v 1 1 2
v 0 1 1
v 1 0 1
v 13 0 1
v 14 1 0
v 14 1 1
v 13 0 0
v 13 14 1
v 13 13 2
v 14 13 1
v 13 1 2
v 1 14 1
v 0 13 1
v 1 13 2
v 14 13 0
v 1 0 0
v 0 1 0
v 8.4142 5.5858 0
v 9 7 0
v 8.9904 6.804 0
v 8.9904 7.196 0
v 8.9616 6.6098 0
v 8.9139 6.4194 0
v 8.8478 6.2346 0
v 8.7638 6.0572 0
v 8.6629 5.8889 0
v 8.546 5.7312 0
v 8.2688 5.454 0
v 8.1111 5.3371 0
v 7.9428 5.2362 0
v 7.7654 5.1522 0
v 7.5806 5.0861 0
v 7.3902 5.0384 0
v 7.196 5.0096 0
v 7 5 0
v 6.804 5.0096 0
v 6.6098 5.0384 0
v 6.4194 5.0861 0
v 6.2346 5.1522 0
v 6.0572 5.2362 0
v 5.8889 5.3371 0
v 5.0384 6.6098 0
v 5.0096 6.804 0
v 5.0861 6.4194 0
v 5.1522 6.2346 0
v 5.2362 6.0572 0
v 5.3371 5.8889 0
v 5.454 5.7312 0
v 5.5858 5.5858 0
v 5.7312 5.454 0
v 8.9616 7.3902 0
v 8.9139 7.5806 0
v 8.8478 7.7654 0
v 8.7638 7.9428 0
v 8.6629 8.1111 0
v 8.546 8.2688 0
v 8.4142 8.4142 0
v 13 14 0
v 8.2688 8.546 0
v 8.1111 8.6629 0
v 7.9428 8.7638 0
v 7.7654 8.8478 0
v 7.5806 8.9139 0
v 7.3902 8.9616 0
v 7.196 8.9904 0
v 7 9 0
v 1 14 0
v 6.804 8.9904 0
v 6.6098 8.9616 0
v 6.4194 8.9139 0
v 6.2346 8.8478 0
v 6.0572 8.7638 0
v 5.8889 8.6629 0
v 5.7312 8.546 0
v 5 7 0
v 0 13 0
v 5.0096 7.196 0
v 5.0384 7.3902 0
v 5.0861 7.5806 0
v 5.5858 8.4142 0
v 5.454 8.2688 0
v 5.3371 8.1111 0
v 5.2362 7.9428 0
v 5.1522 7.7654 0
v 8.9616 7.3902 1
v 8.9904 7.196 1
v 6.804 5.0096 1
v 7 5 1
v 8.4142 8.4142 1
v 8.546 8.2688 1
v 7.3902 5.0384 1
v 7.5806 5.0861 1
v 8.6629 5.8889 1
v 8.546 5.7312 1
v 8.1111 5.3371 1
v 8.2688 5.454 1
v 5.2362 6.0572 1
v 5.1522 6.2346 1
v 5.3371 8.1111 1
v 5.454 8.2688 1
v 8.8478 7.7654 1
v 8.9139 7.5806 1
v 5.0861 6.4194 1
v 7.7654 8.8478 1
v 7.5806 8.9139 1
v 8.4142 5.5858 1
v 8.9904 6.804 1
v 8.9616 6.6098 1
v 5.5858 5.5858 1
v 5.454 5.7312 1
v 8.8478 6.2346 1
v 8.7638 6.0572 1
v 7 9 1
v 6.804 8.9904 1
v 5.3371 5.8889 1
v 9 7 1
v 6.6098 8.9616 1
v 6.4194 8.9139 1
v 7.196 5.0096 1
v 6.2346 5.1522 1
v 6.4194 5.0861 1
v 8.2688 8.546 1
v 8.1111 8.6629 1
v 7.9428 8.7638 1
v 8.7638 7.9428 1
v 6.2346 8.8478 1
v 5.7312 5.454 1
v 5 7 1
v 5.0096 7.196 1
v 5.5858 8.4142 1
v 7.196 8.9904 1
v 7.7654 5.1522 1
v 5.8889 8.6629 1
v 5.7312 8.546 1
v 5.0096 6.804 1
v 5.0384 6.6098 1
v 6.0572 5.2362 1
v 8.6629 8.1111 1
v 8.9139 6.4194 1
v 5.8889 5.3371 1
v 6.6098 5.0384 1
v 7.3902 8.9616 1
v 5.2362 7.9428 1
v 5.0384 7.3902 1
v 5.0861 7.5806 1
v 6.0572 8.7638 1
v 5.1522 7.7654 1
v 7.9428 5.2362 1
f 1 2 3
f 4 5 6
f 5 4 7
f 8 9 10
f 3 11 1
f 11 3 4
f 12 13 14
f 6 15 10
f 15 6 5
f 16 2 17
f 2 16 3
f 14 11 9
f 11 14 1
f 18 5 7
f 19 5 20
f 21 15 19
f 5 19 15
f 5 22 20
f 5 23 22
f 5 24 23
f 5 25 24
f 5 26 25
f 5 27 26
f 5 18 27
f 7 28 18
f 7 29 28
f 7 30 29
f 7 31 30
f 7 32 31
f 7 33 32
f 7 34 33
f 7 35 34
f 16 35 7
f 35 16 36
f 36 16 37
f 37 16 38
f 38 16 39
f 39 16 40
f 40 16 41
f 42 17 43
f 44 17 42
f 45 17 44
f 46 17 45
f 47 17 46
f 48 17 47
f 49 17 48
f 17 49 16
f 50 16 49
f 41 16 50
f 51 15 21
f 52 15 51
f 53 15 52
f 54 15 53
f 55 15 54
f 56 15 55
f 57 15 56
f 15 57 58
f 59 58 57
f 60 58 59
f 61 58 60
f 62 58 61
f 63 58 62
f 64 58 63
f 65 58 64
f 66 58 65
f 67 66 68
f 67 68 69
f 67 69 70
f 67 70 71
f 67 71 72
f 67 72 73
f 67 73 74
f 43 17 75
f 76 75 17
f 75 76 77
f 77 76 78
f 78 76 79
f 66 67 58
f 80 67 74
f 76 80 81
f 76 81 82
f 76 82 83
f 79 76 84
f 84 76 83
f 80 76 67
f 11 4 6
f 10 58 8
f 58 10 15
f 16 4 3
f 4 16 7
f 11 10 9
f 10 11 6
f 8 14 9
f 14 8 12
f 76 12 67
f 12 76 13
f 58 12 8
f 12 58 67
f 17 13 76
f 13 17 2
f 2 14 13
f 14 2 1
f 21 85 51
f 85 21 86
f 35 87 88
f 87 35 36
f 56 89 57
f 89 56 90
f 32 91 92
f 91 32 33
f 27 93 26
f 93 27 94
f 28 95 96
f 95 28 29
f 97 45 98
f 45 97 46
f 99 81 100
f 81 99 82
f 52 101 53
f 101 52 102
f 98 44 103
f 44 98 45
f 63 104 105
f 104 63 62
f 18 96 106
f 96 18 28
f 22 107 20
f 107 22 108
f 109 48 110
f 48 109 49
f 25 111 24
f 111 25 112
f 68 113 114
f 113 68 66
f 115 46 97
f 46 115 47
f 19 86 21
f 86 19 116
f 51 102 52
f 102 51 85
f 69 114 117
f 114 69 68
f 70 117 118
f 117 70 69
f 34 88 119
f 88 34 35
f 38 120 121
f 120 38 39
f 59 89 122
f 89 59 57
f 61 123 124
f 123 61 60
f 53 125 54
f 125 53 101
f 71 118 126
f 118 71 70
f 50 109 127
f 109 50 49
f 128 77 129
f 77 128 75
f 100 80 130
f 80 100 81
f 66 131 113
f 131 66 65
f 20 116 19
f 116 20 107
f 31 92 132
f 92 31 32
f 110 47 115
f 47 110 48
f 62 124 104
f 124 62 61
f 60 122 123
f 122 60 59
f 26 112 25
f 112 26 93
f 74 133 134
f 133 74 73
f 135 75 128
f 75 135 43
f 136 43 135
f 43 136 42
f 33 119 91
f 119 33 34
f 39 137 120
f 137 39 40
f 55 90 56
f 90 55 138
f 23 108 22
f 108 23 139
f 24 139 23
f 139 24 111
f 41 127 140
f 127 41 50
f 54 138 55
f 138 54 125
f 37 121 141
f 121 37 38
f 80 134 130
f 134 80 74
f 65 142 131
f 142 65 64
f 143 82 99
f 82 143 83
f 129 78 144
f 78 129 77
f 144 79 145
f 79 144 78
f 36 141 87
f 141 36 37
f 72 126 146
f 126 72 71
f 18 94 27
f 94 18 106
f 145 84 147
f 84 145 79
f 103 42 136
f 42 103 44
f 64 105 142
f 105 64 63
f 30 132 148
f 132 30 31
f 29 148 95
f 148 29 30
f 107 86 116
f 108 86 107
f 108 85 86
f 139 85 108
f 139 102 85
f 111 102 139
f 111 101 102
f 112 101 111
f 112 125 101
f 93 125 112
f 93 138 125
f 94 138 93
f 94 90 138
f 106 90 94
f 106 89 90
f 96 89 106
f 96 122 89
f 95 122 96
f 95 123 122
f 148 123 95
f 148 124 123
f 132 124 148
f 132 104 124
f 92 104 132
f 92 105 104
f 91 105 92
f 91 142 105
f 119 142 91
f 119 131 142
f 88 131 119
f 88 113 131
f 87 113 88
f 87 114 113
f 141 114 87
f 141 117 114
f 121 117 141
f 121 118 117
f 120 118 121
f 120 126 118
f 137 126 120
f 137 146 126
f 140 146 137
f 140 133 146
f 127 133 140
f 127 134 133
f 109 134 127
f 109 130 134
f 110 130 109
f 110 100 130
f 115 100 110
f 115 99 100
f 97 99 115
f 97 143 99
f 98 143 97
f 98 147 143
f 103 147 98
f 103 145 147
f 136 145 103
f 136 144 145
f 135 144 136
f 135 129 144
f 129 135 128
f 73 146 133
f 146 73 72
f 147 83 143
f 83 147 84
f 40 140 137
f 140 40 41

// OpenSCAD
/* Will create a centerhole with automatic diameter and depth by default 
 * (if 'centerhole' is given). "Auto" simply means "The Right Thing Defined
 * By The Programmer I E God */

module tetrisfirkant(xy=14,z=2,centerhole=false,holedia="auto",holedep="auto") {

    zz = z/2;
    xy=xy-z;
    
    /* I wrote this starting off at polyhedras for the first time, so it
     * became upside down. This fixes it. Really, it's much nicer this way,
     * too. Look! It even comes in pink!!! */
    
    translate([zz,zz,z]) {
        
        difference() {
            polyhedron(
                points=[
                    [0,0,0],[xy,0,0],[xy,xy,0],[0,xy,0],    // 0,1,2,3
                    [0,-zz,-zz],[xy,-zz,-zz],               // 4,5
                    [xy+zz,0,-zz],[xy+zz,xy,-zz],           // 6,7
                    [xy,xy+zz,-zz],[0,xy+zz,-zz],           // 8,9
                    [-zz,xy,-zz],[-zz,0,-zz],               // 10,11

                    [0,-zz,-zz*2],[xy,-zz,-zz*2],           // 12,13
                    [xy+zz,0,-zz*2],[xy+zz,xy,-zz*2],       // 14,15
                    [xy,xy+zz,-zz*2],[0,xy+zz,-zz*2],       // 16,17
                    [-zz,xy,-zz*2],[-zz,0,-zz*2]             // 18,19
                ],

                faces=[
                    [0,2,1],[2,0,3],

                    [0,1,4],[1,5,4],[1,6,5],
                    [1,7,6],[1,2,7],[2,8,7],
                    [2,3,8],[3,9,8],[3,10,9],
                    [3,0,10],[0,11,10],[11,0,4],

                    [4,5,12],[5,13,12],[5,6,13],[6,14,13],
                    [6,15,14],[6,7,15],[7,8,15],[8,16,15],
                    [8,17,16],[8,9,17],[9,18,17],[9,10,18],
                    [10,19,18],[10,11,19],[11,12,19],[4,12,11],

                    [12,13,14],[12,14,19],
                    [19,14,15],[19,15,16],
                    [19,16,17],[19,17,18],
                ]
            );  
            if (centerhole) {
                // Assume auto everything for now
                if (holedia != "auto") {
                    echo("Hole diameter is \"auto\" for now. RTFS, please");
                }
                if (holedia != "auto") {
                    echo("Hole depth is \"auto\" for now. RTFS, please");
                }
                holedep = z/2;
                holedia = 4;
                
                translate([xy/2,xy/2,-z]) {
                    cylinder(h=holedep,d=holedia,$fn=64);
                }
            }
        }
    }
}

module tetromino(name,xy=14,z=2,centerhole=false,holedia="auto",holedep="auto") {
    if (name == "I") {
        translate([xy*0,xy*0,0])
            tetrisfirkant(xy=xy,z=z,centerhole=centerhole,holedia=holedia,holedep=holedep);
        translate([xy*0,xy*1,0])
            tetrisfirkant(xy=xy,z=z,centerhole=centerhole,holedia=holedia,holedep=holedep);
        translate([xy*0,xy*2,0])
            tetrisfirkant(xy=xy,z=z,centerhole=centerhole,holedia=holedia,holedep=holedep);
        translate([xy*0,xy*3,0])
            tetrisfirkant(xy=xy,z=z,centerhole=centerhole,holedia=holedia,holedep=holedep);
    } else if (name == "O") {
        translate([xy*0,xy*0,0])
            tetrisfirkant(xy=xy,z=z,centerhole=centerhole,holedia=holedia,holedep=holedep);
        translate([xy*0,xy*1,0])
            tetrisfirkant(xy=xy,z=z,centerhole=centerhole,holedia=holedia,holedep=holedep);
        translate([xy*1,0,0])
            tetrisfirkant(xy=xy,z=z,centerhole=centerhole,holedia=holedia,holedep=holedep);
        translate([xy*1,xy*1,0])
            tetrisfirkant(xy=xy,z=z,centerhole=centerhole,holedia=holedia,holedep=holedep);
    } else if (name == "T") {
        translate([xy*0,xy*0,0])
            tetrisfirkant(xy=xy,z=z,centerhole=centerhole,holedia=holedia,holedep=holedep);
        translate([xy*1,xy*0,0])
            tetrisfirkant(xy=xy,z=z,centerhole=centerhole,holedia=holedia,holedep=holedep);
        translate([xy*2,xy*0,0])
            tetrisfirkant(xy=xy,z=z,centerhole=centerhole,holedia=holedia,holedep=holedep);
        translate([xy*1,xy*1,0])
            tetrisfirkant(xy=xy,z=z,centerhole=centerhole,holedia=holedia,holedep=holedep);
    } else if (name == "J") {
        translate([xy*0,xy*0,0])
            tetrisfirkant(xy=xy,z=z,centerhole=centerhole,holedia=holedia,holedep=holedep);
        translate([xy*1,xy*0,0])
            tetrisfirkant(xy=xy,z=z,centerhole=centerhole,holedia=holedia,holedep=holedep);
        translate([xy*1,xy*1,0])
            tetrisfirkant(xy=xy,z=z,centerhole=centerhole,holedia=holedia,holedep=holedep);
        translate([xy*1,xy*2,0])
            tetrisfirkant(xy=xy,z=z,centerhole=centerhole,holedia=holedia,holedep=holedep);
    } else if (name == "L") {
        translate([xy*0,xy*0,0])
            tetrisfirkant(xy=xy,z=z,centerhole=centerhole,holedia=holedia,holedep=holedep);
        translate([xy*1,xy*0,0])
            tetrisfirkant(xy=xy,z=z,centerhole=centerhole,holedia=holedia,holedep=holedep);
        translate([xy*0,xy*1,0])
            tetrisfirkant(xy=xy,z=z,centerhole=centerhole,holedia=holedia,holedep=holedep);
        translate([xy*0,xy*2,0])
            tetrisfirkant(xy=xy,z=z,centerhole=centerhole,holedia=holedia,holedep=holedep);
    } else if (name == "S") {
        translate([xy*0,xy*0,0])
            tetrisfirkant(xy=xy,z=z,centerhole=centerhole,holedia=holedia,holedep=holedep);
        translate([xy*1,xy*1,0])
            tetrisfirkant(xy=xy,z=z,centerhole=centerhole,holedia=holedia,holedep=holedep);
        translate([xy*1,xy*0,0])
            tetrisfirkant(xy=xy,z=z,centerhole=centerhole,holedia=holedia,holedep=holedep);
        translate([xy*2,xy*1,0])
            tetrisfirkant(xy=xy,z=z,centerhole=centerhole,holedia=holedia,holedep=holedep);
    } else if (name == "Z") {
        translate([xy*0,xy*1,0])
            tetrisfirkant(xy=xy,z=z,centerhole=centerhole,holedia=holedia,holedep=holedep);
        translate([xy*1,xy*1,0])
            tetrisfirkant(xy=xy,z=z,centerhole=centerhole,holedia=holedia,holedep=holedep);
        translate([xy*1,xy*0,0])
            tetrisfirkant(xy=xy,z=z,centerhole=centerhole,holedia=holedia,holedep=holedep);
        translate([xy*2,xy*0,0])
            tetrisfirkant(xy=xy,z=z,centerhole=centerhole,holedia=holedia,holedep=holedep);
    } else {
        echo("ERROR: Tetromino type \"", name, "\" is unknown");
    }
}

xy=14;

tetrisfirkant(centerhole=true);
/*
tetromino("I",centerhole=true);
translate([xy+2,0,0])
    tetromino("L",centerhole=true);
translate([xy*2+4,xy+2,0])
    tetromino("O",centerhole=true);
translate([xy*3+6,0,0])
    tetromino("J",centerhole=true);
translate([xy*3+2,xy*5+6,0])
    rotate([0,0,180])
        tetromino("T",centerhole=true);
translate([xy*2+4,xy*3+4,0])
    tetromino("S",centerhole=true);
translate([xy*4+8,xy*2+2,0])
    tetromino("Z",centerhole=true);

*/

/*
tetromino("I",centerhole=true);
tetromino("L",centerhole=true);
tetromino("O",centerhole=true);
tetromino("J",centerhole=true);
tetromino("T",centerhole=true);
tetromino("S",centerhole=true);
tetromino("Z",centerhole=true);
*/
